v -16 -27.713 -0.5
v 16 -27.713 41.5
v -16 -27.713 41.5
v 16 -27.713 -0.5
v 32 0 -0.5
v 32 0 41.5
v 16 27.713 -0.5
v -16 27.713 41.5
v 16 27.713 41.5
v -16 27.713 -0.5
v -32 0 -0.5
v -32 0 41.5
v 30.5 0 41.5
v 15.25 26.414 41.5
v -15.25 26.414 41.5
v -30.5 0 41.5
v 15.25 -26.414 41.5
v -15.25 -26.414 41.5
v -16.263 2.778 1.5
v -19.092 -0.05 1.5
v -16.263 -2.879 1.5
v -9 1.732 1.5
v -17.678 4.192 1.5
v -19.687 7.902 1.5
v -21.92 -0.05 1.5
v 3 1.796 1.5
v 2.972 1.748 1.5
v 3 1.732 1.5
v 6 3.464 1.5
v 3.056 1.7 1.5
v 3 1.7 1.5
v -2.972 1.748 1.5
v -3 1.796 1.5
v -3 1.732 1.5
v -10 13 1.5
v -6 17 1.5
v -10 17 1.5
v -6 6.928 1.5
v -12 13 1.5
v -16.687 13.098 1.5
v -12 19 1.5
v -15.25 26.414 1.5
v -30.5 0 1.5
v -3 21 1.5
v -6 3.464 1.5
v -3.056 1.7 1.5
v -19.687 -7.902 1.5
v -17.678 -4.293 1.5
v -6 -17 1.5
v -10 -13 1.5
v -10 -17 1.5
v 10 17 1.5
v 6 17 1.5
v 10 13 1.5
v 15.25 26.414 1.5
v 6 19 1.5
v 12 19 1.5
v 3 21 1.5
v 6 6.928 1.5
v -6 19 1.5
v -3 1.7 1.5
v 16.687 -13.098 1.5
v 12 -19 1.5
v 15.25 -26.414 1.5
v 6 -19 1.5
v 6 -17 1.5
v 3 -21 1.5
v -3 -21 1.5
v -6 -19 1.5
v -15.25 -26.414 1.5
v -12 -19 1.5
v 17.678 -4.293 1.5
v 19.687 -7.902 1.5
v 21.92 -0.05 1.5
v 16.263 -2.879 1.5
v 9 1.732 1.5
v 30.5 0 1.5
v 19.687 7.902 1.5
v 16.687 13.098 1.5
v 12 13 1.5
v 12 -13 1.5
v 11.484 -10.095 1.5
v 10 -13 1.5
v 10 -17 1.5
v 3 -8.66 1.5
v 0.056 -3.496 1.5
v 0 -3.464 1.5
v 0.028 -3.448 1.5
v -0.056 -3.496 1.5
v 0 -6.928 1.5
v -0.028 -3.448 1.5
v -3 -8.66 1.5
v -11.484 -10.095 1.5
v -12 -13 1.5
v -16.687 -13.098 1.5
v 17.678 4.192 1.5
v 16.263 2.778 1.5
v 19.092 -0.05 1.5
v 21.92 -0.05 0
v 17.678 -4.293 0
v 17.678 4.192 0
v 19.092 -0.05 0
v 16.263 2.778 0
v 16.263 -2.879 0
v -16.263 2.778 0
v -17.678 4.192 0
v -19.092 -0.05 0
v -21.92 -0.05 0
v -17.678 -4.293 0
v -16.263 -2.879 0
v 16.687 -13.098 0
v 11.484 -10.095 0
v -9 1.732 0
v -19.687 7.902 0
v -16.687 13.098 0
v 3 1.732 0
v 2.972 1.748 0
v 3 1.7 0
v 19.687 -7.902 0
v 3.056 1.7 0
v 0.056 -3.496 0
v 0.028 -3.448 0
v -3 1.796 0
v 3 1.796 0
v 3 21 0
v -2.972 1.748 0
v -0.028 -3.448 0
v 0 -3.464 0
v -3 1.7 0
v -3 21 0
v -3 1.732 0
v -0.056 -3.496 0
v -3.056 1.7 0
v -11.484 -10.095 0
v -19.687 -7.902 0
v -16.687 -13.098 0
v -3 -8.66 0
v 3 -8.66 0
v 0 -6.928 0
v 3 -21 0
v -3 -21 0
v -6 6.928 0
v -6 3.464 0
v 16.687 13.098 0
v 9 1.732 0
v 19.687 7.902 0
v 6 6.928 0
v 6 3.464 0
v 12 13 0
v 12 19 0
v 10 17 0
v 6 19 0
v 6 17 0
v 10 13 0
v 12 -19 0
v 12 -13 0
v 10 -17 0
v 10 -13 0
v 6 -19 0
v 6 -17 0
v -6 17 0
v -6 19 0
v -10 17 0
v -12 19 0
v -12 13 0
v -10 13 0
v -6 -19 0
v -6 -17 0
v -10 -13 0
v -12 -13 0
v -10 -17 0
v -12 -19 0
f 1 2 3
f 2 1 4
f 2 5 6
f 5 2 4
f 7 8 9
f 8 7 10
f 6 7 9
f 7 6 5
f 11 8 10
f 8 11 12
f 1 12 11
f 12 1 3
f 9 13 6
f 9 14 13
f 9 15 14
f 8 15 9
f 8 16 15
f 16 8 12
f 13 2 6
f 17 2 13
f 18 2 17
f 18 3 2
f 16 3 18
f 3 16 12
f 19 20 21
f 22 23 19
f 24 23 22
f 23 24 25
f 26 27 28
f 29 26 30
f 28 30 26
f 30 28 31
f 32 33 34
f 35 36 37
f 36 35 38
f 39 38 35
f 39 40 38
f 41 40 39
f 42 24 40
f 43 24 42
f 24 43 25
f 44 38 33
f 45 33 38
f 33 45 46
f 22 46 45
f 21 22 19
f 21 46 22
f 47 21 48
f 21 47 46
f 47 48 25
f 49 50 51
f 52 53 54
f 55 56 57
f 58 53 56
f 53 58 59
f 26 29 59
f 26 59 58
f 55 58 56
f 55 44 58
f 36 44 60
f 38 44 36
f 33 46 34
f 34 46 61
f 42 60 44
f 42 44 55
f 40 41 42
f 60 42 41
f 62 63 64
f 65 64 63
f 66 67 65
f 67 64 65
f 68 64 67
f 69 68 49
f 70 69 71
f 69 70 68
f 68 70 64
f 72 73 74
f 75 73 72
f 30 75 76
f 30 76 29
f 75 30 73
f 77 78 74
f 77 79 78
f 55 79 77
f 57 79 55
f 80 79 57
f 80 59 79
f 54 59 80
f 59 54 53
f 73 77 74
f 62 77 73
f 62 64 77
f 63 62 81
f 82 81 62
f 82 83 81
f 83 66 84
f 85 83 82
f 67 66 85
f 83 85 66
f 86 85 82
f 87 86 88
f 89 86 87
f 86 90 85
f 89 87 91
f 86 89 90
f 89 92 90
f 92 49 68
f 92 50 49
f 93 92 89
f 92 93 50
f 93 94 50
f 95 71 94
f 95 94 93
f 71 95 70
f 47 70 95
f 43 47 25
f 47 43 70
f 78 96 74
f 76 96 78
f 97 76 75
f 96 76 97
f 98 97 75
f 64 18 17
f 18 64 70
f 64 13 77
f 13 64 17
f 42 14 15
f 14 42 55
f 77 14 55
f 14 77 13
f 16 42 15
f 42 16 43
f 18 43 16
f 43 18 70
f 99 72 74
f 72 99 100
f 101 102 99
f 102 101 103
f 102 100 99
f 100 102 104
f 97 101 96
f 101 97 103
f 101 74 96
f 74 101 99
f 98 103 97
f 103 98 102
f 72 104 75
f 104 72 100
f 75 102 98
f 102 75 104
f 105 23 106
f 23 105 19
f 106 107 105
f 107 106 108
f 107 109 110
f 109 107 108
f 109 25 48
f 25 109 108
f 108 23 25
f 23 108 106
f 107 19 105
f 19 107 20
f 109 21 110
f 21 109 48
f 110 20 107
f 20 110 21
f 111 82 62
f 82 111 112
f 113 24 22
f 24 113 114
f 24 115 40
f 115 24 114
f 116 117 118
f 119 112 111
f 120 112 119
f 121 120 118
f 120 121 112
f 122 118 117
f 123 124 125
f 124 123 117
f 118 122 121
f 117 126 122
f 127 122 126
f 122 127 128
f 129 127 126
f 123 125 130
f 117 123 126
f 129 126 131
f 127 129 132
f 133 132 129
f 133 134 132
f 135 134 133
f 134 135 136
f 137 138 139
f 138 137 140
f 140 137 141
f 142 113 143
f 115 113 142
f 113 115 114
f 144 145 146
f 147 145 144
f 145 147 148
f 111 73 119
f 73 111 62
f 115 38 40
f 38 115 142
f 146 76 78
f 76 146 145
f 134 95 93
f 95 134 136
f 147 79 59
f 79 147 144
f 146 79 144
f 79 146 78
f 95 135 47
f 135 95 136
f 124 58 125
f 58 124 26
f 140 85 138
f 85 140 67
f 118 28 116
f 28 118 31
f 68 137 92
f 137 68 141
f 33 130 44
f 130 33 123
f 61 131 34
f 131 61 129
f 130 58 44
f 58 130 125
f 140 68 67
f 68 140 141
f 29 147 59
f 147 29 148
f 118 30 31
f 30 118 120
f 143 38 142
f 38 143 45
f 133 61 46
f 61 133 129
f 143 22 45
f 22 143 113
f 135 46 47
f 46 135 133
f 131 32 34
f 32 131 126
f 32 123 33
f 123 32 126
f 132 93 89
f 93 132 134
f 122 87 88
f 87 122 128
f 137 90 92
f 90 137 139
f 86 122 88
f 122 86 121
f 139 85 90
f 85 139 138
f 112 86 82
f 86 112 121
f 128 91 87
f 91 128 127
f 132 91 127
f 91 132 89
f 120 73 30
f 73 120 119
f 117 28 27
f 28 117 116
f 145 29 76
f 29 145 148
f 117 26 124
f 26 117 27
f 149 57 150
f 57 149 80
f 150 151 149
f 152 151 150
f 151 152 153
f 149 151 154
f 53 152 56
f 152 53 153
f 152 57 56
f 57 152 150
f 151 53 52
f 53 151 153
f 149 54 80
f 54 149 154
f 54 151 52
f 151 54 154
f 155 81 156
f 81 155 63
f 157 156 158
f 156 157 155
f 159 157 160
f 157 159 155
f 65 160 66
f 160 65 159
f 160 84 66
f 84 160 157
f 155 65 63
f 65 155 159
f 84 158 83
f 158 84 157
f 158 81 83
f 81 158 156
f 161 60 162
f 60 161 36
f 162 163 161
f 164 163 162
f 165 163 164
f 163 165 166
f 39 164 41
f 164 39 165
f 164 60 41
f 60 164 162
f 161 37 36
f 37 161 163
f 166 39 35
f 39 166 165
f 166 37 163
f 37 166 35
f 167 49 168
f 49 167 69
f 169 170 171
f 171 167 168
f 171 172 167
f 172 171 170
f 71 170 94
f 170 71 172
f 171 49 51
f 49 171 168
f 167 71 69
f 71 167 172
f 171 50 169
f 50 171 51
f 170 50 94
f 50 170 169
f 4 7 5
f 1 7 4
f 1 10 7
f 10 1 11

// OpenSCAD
translate([0,0,21.5]){
    difference(){
        cylinder(r=32, h=40, $fn=6, center=true);
        cylinder(r=30.5, h=42, $fn=6, center=true);
    }
}
difference(){
    translate([0,0,0.5]){
        color([0.2,0.2,0.2]){
            cylinder(r=32, h=2, $fn=6, center=true);
        }
    }
    union(){
        translate([0,-5,0]){
            rotate([0,0,-45]){
                union(){
                    translate([9,18,5]){
                        rotate([0,0,0]){
                            color([0.2,0.4,0.2]){
                                cube([6,2,10],center=true);
                            }
                        }
                    }
                    translate([11,16,5]){
                        rotate([0,0,90]){
                            color([0.2,0.4,0.2]){
                                cube([6,2,10],center=true);
                            }
                        }
                    }
                }
            }
        }
        translate([0,-5,0]){
            rotate([0,0,45]){
                union(){
                    translate([-9,18,5]){
                        rotate([0,0,0]){
                            color([0.2,0.4,0.2]){
                                cube([6,2,10],center=true);
                            }
                        }
                    }
                    translate([-11,16,5]){
                        rotate([0,0,90]){
                            color([0.2,0.4,0.2]){
                                cube([6,2,10],center=true);
                            }
                        }
                    }
                }
            }
        }
        translate([9,18,5]){
            rotate([0,0,0]){
                color([0.2,0.4,0.2]){
                    cube([6,2,10],center=true);
                }
            }
        }
        translate([11,16,5]){
            rotate([0,0,90]){
                color([0.2,0.4,0.2]){
                    cube([6,2,10],center=true);
                }
            }
        }

        translate([9,-18,5]){
            rotate([0,0,0]){
                color([0.2,0.4,0.2]){
                    cube([6,2,10],center=true);
                }
            }
        }
        translate([11,-16,5]){
            rotate([0,0,90]){
                color([0.2,0.4,0.2]){
                    cube([6,2,10],center=true);
                }
            }
        }

        translate([-9,18,5]){
            rotate([0,0,0]){
                color([0.2,0.4,0.2]){
                    cube([6,2,10],center=true);
                }
            }
        }
        translate([-11,16,5]){
            rotate([0,0,90]){
                color([0.2,0.4,0.2]){
                    cube([6,2,10],center=true);
                }
            }
        }

        translate([-9,-18,5]){
            rotate([0,0,0]){
                color([0.2,0.4,0.2]){
                    cube([6,2,10],center=true);
                }
            }
        }
        translate([-11,-16,5]){
            rotate([0,0,90]){
                color([0.2,0.4,0.2]){
                    cube([6,2,10],center=true);
                }
            }
        }
        difference(){
            union(){
                translate([0,0,5]){
                    rotate([0,0,60]){
                        cube([6,42,10],center=true);
                    }
                }
                translate([0,0,5]){
                    rotate([0,0,-60]){
                        cube([6,42,10],center=true);
                    }
                }
                translate([0,0,5]){
                    rotate([0,0,0]){
                        cube([6,42,10],center=true);
                    }
                }
            }
            union(){
                rotate([0,0,0]){
                    translate([3,1.7,-1]){
                        color([0.4,0.2,0.2]){
                            cube([3, 19.3, 10]);
                        }
                    }
                    translate([-6,1.7,-1]){
                        color([0.4,0.2,0.2]){
                            cube([3, 19.3, 10]);
                        }
                    }
                }
                rotate([0,0,120]){
                    translate([3,1.7,-1]){
                        color([0.4,0.2,0.2]){
                            cube([3, 19.3, 10]);
                        }
                    }
                    translate([-6,1.7,-1]){
                        color([0.4,0.2,0.2]){
                            cube([3, 19.3, 10]);
                        }
                    }
                }
                rotate([0,0,-120]){
                    translate([3,1.7,-1]){
                        color([0.4,0.2,0.2]){
                            cube([3, 19.3, 10]);
                        }
                    }
                    translate([-6,1.7,-1]){
                        color([0.4,0.2,0.2]){
                            cube([3, 19.3, 10]);
                        }
                    }
                }
            }
        }
    }
}
